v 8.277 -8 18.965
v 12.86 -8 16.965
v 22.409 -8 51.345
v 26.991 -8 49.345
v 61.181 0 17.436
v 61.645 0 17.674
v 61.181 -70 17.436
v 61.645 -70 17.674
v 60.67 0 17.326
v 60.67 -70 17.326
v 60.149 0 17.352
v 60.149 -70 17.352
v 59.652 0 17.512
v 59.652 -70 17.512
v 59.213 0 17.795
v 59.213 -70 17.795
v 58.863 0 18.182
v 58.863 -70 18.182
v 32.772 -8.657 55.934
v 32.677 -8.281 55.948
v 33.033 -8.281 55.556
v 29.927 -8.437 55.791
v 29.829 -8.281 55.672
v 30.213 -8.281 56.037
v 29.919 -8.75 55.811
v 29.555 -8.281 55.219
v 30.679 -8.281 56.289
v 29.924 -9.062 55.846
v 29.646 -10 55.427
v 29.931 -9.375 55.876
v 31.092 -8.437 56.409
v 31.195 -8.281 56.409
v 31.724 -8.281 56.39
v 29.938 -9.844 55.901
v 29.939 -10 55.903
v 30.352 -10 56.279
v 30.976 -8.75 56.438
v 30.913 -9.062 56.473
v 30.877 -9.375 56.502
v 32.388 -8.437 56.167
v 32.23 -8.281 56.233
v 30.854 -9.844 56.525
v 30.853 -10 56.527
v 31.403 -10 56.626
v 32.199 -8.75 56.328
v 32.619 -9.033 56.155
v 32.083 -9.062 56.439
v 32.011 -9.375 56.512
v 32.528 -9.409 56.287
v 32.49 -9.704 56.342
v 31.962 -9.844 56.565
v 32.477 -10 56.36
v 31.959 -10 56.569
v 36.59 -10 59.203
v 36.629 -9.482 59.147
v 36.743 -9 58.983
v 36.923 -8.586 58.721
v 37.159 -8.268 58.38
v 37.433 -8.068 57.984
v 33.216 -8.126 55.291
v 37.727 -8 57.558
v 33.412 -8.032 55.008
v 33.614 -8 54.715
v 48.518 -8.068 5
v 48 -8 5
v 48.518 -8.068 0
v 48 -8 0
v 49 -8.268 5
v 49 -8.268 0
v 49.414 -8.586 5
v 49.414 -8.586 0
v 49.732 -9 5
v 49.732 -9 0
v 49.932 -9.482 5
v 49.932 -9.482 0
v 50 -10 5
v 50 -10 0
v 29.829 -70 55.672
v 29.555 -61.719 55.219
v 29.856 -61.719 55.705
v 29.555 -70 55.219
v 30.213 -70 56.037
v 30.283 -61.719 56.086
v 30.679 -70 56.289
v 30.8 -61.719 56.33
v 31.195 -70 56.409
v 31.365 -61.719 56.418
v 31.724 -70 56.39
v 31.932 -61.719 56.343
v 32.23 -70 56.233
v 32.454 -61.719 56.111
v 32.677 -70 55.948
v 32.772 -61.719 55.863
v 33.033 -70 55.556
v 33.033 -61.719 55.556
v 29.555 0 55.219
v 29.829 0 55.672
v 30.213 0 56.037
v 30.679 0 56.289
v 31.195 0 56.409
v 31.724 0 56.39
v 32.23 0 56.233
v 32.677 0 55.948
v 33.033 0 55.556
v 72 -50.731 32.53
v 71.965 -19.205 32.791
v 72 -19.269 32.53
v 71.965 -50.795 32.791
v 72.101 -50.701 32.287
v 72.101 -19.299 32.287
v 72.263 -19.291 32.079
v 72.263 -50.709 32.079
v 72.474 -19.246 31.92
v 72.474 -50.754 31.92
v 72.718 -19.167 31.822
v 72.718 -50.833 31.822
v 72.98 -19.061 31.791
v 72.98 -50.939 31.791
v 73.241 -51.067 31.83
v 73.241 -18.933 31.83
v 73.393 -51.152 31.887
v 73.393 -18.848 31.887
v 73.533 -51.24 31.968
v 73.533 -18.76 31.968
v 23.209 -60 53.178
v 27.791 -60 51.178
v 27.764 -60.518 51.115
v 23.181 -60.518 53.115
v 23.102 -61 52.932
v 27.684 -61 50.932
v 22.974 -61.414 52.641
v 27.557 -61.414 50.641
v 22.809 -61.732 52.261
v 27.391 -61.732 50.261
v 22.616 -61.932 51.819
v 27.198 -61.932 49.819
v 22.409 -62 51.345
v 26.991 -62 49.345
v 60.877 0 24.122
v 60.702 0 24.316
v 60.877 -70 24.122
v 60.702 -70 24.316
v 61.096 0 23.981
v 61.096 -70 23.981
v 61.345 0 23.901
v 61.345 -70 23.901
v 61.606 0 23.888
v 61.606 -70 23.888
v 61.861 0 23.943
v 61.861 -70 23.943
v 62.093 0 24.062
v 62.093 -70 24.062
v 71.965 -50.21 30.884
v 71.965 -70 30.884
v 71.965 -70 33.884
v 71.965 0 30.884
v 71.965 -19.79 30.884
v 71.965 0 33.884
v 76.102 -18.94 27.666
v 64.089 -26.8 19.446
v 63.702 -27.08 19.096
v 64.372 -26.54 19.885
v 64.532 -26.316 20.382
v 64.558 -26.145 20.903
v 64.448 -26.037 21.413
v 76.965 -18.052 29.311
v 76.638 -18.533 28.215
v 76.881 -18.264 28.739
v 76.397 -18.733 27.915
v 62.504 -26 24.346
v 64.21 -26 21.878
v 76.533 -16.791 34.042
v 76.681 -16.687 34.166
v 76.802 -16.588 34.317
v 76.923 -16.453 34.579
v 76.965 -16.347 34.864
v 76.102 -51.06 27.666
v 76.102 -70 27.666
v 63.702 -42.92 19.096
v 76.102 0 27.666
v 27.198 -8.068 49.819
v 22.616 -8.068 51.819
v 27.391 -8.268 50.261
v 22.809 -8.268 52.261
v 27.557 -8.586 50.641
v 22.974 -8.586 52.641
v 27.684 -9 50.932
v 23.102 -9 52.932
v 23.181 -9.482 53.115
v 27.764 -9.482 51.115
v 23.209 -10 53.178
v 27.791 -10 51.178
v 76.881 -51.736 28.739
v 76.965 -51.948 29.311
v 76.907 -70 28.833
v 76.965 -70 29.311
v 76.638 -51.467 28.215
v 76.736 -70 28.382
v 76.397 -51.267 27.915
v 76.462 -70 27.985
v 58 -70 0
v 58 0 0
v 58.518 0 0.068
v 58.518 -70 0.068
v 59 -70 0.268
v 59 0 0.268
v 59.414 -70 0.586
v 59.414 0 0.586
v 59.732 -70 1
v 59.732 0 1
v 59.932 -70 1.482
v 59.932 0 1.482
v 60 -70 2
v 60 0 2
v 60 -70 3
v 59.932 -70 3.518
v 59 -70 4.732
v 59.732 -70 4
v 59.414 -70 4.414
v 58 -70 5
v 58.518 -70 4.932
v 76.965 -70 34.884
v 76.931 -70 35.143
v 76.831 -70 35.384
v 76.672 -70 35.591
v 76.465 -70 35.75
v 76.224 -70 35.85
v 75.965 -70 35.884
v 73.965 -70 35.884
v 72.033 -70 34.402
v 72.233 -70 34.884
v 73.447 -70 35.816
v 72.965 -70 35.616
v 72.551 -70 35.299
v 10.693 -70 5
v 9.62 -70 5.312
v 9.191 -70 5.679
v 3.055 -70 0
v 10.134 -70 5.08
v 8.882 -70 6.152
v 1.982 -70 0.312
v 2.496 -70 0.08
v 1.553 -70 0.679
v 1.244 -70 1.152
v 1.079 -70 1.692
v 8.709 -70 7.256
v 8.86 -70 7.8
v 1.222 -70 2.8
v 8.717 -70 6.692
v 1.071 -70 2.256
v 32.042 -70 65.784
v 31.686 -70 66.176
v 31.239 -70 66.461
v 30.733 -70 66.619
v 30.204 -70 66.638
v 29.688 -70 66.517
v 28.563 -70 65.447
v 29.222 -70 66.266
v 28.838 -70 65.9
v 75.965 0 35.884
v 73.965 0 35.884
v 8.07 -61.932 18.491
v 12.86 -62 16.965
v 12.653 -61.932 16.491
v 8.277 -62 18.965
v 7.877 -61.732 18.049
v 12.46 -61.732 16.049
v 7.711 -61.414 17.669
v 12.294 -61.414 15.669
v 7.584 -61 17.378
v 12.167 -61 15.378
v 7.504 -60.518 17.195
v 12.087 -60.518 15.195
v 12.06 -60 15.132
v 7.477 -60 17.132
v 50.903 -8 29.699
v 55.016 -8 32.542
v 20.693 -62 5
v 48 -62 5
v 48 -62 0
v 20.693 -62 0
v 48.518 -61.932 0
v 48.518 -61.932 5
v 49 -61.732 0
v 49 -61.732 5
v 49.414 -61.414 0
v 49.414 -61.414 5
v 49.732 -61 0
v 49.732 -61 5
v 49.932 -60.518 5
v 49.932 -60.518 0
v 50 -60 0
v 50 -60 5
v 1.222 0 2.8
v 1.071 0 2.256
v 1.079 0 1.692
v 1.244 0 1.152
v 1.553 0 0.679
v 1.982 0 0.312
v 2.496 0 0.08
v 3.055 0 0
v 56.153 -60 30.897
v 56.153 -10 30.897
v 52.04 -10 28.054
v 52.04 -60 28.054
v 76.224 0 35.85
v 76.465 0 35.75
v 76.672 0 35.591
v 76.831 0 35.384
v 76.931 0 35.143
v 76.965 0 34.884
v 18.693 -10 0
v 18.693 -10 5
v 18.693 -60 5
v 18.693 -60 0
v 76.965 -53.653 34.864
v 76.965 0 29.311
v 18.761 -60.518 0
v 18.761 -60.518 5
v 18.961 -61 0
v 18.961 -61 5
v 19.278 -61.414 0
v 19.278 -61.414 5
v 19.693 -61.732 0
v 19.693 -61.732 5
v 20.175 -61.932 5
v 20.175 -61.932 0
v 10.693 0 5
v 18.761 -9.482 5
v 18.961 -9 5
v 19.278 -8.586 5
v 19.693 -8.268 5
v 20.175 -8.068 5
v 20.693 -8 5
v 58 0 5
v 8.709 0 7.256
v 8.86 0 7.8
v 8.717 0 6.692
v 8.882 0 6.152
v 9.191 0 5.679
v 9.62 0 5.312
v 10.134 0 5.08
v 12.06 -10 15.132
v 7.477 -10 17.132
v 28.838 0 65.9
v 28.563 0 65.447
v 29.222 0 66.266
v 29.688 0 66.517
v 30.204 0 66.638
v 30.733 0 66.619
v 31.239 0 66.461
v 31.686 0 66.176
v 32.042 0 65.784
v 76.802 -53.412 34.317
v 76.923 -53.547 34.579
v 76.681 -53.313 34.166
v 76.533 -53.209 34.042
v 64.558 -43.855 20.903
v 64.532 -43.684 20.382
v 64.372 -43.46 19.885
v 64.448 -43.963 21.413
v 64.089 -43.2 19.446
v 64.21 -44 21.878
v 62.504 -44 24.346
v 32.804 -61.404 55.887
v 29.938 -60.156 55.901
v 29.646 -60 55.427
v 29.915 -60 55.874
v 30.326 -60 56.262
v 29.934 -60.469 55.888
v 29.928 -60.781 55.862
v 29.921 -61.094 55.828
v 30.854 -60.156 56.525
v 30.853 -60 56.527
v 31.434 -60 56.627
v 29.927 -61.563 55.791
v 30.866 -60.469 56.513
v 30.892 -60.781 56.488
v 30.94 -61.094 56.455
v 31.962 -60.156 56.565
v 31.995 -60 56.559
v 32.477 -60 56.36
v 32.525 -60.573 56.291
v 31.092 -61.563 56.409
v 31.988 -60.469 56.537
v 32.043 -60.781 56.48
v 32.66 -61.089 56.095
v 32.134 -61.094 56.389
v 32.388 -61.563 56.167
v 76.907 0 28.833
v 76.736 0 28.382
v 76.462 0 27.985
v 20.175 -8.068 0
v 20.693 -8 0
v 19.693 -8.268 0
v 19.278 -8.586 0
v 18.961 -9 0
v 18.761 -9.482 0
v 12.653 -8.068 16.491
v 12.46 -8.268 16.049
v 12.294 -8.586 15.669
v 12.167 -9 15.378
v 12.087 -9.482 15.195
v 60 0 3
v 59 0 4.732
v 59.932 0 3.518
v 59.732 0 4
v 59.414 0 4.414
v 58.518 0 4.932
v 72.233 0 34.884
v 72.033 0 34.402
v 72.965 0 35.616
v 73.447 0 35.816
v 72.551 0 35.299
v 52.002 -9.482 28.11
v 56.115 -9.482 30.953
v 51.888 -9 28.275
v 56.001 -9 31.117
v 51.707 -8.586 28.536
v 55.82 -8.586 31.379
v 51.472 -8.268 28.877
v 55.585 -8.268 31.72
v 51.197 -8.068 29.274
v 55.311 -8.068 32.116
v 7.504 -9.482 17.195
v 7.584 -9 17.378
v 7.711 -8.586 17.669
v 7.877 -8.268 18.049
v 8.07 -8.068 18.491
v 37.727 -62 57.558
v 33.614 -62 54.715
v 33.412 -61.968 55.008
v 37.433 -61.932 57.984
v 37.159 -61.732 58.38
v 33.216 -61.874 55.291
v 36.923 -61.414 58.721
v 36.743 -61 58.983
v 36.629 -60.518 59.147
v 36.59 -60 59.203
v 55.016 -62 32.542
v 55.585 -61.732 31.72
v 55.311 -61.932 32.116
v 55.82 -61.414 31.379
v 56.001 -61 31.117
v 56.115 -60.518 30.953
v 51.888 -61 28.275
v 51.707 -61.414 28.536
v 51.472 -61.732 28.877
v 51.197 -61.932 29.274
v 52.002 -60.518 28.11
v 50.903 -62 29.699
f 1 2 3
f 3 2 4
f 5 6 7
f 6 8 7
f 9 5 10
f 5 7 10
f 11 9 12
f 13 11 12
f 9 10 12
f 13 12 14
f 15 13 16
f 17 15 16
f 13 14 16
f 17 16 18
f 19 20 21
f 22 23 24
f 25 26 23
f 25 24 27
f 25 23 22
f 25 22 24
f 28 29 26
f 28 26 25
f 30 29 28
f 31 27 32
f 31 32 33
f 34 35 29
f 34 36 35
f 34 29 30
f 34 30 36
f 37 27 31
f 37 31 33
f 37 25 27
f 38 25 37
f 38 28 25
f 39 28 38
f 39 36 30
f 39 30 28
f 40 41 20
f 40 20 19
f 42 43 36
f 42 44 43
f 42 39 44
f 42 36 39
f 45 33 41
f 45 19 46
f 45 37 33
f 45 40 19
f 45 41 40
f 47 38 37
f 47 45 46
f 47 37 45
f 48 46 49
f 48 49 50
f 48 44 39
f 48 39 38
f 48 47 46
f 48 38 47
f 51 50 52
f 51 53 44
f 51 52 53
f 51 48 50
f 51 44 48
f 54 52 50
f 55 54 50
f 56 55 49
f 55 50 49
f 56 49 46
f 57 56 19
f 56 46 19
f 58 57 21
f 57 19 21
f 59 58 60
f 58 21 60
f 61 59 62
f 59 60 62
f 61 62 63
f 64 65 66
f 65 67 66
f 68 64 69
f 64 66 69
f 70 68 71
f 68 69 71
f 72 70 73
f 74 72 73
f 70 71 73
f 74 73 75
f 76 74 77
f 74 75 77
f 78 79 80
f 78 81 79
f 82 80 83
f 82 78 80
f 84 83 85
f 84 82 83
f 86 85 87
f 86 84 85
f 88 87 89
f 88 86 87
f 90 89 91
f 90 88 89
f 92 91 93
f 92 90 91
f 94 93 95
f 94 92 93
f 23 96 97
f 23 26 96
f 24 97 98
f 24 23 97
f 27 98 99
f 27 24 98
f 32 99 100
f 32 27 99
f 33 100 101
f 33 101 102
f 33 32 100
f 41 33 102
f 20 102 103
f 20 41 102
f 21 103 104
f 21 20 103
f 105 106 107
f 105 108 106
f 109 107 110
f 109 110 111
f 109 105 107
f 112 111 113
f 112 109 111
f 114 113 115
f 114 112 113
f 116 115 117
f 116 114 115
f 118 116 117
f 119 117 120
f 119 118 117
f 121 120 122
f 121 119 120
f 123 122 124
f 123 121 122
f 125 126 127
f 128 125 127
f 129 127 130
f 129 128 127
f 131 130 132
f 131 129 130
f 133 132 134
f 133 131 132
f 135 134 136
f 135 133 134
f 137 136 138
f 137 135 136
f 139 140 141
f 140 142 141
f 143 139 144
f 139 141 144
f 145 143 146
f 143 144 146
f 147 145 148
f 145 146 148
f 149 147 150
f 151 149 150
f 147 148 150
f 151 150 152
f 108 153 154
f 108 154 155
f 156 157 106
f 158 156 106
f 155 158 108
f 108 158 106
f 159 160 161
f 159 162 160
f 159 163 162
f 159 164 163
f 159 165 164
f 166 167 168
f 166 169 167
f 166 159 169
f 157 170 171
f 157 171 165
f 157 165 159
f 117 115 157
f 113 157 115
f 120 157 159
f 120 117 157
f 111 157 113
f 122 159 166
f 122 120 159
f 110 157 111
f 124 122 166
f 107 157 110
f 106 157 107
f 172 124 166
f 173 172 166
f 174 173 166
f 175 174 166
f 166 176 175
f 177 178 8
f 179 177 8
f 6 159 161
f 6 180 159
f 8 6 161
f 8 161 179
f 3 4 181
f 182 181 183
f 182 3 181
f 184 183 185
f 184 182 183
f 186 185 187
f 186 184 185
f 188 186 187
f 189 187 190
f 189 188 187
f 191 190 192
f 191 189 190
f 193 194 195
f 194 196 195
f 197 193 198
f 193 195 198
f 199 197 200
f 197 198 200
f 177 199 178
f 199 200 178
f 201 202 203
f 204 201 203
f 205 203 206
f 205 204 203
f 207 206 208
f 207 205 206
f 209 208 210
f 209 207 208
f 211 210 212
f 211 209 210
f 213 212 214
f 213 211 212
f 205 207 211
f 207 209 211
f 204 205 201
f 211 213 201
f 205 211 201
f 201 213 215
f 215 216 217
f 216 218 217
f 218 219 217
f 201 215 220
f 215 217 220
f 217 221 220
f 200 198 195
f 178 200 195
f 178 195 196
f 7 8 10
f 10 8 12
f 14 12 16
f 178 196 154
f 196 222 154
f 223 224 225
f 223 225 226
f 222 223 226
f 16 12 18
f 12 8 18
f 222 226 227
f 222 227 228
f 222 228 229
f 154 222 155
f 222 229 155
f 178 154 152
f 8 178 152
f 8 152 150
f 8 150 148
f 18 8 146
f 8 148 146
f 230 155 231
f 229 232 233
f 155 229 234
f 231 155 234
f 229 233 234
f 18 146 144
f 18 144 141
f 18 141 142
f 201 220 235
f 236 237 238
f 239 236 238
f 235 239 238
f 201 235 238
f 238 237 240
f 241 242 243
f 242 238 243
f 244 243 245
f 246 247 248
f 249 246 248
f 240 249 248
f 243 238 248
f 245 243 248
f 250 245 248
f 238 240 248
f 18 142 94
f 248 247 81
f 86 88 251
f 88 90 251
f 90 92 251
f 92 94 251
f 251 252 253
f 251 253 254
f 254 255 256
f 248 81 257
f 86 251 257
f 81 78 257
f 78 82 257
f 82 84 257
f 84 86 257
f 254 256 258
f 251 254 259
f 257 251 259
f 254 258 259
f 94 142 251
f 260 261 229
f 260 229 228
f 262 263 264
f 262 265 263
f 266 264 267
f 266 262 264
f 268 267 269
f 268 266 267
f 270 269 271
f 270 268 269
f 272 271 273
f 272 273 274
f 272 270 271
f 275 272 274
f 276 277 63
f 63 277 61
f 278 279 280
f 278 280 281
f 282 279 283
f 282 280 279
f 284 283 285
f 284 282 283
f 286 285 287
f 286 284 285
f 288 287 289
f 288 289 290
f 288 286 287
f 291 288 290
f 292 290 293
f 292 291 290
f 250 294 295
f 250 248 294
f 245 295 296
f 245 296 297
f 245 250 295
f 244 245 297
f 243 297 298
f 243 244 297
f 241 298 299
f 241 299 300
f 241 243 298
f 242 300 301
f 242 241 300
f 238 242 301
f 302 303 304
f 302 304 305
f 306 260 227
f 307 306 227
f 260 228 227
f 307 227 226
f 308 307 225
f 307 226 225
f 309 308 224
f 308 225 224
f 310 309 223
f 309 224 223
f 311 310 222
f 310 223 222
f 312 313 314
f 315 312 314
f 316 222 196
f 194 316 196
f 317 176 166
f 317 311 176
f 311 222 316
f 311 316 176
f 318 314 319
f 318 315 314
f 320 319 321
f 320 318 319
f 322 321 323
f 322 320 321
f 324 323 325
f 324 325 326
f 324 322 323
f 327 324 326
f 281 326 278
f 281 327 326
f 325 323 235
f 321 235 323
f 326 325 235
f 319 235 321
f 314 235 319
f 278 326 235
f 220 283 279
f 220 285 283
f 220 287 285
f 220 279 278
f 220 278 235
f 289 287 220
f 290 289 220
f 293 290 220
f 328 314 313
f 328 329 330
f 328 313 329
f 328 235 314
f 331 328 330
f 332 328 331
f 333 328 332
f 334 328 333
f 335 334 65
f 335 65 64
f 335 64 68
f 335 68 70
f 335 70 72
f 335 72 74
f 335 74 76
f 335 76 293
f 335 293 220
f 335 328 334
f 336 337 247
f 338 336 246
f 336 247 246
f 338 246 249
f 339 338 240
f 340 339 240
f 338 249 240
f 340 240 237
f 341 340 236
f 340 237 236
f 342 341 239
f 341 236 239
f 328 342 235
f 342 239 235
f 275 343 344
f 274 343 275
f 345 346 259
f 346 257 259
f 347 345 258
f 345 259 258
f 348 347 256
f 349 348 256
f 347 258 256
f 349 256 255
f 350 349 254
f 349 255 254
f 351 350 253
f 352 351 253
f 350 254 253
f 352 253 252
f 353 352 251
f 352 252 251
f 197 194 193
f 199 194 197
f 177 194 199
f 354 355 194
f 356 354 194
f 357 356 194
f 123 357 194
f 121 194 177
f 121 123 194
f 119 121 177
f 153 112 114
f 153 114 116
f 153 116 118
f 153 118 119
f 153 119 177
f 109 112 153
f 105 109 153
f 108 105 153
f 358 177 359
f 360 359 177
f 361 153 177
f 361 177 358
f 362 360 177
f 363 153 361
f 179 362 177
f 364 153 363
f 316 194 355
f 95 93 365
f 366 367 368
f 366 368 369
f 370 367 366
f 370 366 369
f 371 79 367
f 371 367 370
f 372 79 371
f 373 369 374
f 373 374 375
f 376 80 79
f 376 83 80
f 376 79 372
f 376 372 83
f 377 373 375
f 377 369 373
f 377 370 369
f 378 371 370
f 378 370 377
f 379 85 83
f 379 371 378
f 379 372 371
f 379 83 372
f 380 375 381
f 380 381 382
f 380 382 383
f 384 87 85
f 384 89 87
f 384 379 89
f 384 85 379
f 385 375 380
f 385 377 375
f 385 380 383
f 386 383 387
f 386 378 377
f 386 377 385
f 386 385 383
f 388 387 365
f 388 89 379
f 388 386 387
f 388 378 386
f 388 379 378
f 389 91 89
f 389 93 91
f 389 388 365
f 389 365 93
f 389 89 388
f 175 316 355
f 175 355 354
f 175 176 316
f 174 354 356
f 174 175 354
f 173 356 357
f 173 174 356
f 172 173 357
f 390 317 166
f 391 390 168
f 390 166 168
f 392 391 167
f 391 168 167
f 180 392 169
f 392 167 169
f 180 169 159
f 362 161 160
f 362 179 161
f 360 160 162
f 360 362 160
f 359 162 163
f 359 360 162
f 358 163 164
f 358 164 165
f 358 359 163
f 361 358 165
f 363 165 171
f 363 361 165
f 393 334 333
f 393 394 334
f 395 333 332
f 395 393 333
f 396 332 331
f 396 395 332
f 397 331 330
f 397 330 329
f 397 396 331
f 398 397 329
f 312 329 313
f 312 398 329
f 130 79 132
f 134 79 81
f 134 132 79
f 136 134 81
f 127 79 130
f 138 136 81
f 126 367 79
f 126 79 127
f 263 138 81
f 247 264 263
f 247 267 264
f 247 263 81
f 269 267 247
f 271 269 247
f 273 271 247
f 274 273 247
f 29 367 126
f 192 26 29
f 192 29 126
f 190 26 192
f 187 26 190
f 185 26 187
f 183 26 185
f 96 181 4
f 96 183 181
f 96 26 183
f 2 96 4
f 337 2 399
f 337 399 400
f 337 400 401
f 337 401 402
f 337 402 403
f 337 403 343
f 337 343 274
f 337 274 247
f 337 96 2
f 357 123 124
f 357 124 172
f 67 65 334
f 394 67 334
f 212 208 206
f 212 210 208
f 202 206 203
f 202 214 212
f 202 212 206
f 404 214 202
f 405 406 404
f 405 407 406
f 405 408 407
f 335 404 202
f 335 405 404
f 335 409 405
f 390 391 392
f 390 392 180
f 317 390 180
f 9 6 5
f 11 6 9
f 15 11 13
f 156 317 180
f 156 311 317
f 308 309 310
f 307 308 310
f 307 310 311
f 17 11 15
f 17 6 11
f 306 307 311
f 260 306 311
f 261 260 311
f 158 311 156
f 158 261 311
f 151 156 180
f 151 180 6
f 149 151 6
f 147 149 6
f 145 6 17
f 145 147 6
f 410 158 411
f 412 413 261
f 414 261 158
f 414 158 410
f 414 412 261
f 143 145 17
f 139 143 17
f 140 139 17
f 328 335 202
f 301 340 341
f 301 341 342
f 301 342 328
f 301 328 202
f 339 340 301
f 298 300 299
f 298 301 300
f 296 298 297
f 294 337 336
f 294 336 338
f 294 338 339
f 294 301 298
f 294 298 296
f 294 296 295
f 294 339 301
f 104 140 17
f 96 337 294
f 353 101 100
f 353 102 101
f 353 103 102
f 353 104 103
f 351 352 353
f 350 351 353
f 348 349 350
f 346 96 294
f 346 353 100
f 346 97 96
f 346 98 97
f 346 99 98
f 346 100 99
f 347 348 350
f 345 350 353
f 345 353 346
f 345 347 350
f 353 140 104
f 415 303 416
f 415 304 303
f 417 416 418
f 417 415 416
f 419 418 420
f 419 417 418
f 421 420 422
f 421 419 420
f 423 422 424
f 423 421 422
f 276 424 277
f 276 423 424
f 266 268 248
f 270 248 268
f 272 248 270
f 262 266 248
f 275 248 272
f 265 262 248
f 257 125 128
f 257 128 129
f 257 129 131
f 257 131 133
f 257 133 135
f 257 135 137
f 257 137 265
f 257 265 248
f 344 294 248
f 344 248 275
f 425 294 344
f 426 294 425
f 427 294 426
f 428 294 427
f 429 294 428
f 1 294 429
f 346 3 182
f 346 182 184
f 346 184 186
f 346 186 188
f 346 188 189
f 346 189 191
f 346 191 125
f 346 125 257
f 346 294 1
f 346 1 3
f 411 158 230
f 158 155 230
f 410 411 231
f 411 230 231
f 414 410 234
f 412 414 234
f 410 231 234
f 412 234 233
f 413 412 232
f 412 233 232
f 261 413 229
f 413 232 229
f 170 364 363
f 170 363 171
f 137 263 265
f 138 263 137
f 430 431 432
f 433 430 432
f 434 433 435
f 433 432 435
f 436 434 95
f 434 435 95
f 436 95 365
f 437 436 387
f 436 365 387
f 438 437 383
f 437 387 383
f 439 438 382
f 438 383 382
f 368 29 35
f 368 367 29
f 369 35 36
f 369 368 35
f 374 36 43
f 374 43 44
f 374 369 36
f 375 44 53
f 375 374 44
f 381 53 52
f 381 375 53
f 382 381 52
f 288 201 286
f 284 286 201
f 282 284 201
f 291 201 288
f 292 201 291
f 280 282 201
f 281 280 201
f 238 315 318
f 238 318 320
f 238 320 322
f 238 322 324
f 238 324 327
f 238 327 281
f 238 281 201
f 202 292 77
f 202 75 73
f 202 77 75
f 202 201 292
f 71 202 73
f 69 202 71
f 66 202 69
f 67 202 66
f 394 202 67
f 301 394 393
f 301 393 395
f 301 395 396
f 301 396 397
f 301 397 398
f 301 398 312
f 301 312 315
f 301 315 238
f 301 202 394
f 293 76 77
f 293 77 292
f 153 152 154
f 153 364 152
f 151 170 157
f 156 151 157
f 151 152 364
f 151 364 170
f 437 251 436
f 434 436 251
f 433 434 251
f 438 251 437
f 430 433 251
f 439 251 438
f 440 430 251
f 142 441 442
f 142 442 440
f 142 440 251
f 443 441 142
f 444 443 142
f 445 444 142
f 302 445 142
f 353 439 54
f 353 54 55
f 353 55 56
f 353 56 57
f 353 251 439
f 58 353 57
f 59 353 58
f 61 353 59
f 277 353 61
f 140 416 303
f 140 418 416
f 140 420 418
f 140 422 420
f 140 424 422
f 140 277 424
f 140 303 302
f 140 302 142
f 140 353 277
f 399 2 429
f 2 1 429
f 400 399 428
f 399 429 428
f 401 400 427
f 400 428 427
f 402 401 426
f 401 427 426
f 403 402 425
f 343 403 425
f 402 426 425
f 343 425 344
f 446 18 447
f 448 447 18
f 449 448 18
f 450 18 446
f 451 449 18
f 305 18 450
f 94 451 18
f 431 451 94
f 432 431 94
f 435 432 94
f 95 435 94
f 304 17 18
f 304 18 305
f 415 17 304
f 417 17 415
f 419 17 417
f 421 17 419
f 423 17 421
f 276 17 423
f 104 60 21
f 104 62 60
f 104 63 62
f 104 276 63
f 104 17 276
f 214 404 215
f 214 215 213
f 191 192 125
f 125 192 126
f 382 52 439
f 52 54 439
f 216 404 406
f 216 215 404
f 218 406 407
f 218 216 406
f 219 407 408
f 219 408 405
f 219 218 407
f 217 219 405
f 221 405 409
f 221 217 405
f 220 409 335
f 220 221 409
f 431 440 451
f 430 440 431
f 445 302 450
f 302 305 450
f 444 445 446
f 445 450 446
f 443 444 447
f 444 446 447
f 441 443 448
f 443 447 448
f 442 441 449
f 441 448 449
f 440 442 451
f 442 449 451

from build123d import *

# Parameters (mm, degrees)
PAD_DEPTH       = 70
POCKET_DEPTH    = 28.2506186199
FILLET_R        = 2
FILLET001_R     = 1
FILLET002_R     = 2
FILLET003_R     = 2
SKETCH002_W     = 34.4087464699
SKETCH002_H     = 54
POCKET001_DEPTH = 5
SKETCH003_W     = 39.3291895531
SKETCH003_H     = 54
POCKET002_DEPTH = 5
SKETCH004_W     = 31.3073233784
SKETCH004_H     = 54
POCKET003_DEPTH = 5
FILLET004_R     = 2
FILLET005_R     = 2


with BuildPart() as part:
    # Sketch → Pad (new body)
    with BuildSketch(Plane.XZ):
        Polygon((0, 0), (30, 68.7386354243), (61.2704610896, 23.4931023493), (71.9648598164, 30.8843022432), (71.9648598164, 35.8843022432), (76.9648598164, 35.8843022432), (76.9648598164, 28.2619948796), (60, 16.5371028798), (30.9913221648, 58.5100398536), (7.6376261583, 5), (60, 5), (60, 0), align=None)
    extrude(amount=PAD_DEPTH)

    # Sketch001 (on Face3 of Pad) → Pocket (cut, through all)
    with BuildSketch(Plane(origin=(8.8177286613, 0, -12.7584570195), x_dir=(-0.8226460559, 0, -0.568553838), z_dir=(-0.568553838, 0, 0.8226460559))):
        Polygon((-90.2609966662, 57.5), (-65.2609966662, 44), (-65.2609966662, 26), (-90.2609966662, 12.5), align=None)
    extrude(amount=-POCKET_DEPTH, mode=Mode.SUBTRACT)

    # Fillet
    fillet_edges = [part.edges().sort_by_distance(p)[0] for p in [
        (60, -35, 5),
        (60, -35, 0),
        (30, -35, 68.738635),
        (0, -35, 0),
        (60, -35, 16.537103),
        (71.96486, -35, 35.884302),
        (76.96486, -60.813023, 28.261995),
        (76.96486, -9.186977, 28.261995),
    ]]
    fillet(fillet_edges, radius=FILLET_R)

    # Fillet001
    fillet001_edges = [part.edges().sort_by_distance(p)[0] for p in [
        (61.270461, -35, 23.493102),
        (76.96486, -35, 35.884302),
        (76.96486, -35, 34.339943),
        (71.96486, -35, 30.884302),
    ]]
    fillet(fillet001_edges, radius=FILLET001_R)

    # Fillet002
    fillet002_edges = [part.edges().sort_by_distance(p)[0] for p in [
        (7.637626, -35, 5),
    ]]
    fillet(fillet002_edges, radius=FILLET002_R)

    # Fillet003
    fillet003_edges = [part.edges().sort_by_distance(p)[0] for p in [
        (65.347199, -35, 20.232703),
    ]]
    fillet(fillet003_edges, radius=FILLET003_R)

    # Sketch002 (on Face29 of Fillet003) → Pocket001 (cut)
    with BuildSketch(Plane(origin=(52.4527324283, 0, 36.2515593688), x_dir=(-0.568553838, 0, 0.8226460559), z_dir=(0.8226460559, 0, 0.568553838))):
        with Locations((10.6953254156, 35)):
            Rectangle(SKETCH002_W, SKETCH002_H)
    extrude(amount=-POCKET001_DEPTH, mode=Mode.SUBTRACT)

    # Sketch003 (on Face20 of Pocket001) → Pocket002 (cut)
    with BuildSketch(Plane(origin=(4.582575695, 0, -2), x_dir=(0.4, 0, 0.916515139), z_dir=(0.916515139, 0, -0.4))):
        with Locations((38.3572713981, 35)):
            Rectangle(SKETCH003_W, SKETCH003_H)
    extrude(amount=-POCKET002_DEPTH, mode=Mode.SUBTRACT)

    # Sketch004 (on Face17 of Pocket002) → Pocket003 (cut)
    with BuildSketch(Plane(origin=(0, 0, 5), x_dir=(-1, 0, 0), z_dir=(0, 0, 1))):
        with Locations((-34.3463383108, 35)):
            Rectangle(SKETCH004_W, SKETCH004_H)
    extrude(amount=-POCKET003_DEPTH, mode=Mode.SUBTRACT)

    # Fillet004
    fillet004_edges = [part.edges().sort_by_distance(p)[0] for p in [
        (54.096861, -8, 29.475532),
        (34.533637, -8, 57.781752),
        (34.533637, -62, 57.781752),
        (54.096861, -62, 29.475532),
        (18.692677, -62, 2.5),
        (18.692677, -8, 2.5),
        (50, -8, 2.5),
        (50, -62, 2.5),
        (9.768358, -62, 16.132121),
        (9.768358, -8, 16.132121),
        (25.500034, -8, 52.177919),
        (25.500034, -62, 52.177919),
    ]]
    fillet(fillet004_edges, radius=FILLET004_R)

    # Fillet005
    fillet005_edges = [part.edges().sort_by_distance(p)[0] for p in [
        (30.991322, -35, 58.51004),
    ]]
    fillet(fillet005_edges, radius=FILLET005_R)


solid = part.part
